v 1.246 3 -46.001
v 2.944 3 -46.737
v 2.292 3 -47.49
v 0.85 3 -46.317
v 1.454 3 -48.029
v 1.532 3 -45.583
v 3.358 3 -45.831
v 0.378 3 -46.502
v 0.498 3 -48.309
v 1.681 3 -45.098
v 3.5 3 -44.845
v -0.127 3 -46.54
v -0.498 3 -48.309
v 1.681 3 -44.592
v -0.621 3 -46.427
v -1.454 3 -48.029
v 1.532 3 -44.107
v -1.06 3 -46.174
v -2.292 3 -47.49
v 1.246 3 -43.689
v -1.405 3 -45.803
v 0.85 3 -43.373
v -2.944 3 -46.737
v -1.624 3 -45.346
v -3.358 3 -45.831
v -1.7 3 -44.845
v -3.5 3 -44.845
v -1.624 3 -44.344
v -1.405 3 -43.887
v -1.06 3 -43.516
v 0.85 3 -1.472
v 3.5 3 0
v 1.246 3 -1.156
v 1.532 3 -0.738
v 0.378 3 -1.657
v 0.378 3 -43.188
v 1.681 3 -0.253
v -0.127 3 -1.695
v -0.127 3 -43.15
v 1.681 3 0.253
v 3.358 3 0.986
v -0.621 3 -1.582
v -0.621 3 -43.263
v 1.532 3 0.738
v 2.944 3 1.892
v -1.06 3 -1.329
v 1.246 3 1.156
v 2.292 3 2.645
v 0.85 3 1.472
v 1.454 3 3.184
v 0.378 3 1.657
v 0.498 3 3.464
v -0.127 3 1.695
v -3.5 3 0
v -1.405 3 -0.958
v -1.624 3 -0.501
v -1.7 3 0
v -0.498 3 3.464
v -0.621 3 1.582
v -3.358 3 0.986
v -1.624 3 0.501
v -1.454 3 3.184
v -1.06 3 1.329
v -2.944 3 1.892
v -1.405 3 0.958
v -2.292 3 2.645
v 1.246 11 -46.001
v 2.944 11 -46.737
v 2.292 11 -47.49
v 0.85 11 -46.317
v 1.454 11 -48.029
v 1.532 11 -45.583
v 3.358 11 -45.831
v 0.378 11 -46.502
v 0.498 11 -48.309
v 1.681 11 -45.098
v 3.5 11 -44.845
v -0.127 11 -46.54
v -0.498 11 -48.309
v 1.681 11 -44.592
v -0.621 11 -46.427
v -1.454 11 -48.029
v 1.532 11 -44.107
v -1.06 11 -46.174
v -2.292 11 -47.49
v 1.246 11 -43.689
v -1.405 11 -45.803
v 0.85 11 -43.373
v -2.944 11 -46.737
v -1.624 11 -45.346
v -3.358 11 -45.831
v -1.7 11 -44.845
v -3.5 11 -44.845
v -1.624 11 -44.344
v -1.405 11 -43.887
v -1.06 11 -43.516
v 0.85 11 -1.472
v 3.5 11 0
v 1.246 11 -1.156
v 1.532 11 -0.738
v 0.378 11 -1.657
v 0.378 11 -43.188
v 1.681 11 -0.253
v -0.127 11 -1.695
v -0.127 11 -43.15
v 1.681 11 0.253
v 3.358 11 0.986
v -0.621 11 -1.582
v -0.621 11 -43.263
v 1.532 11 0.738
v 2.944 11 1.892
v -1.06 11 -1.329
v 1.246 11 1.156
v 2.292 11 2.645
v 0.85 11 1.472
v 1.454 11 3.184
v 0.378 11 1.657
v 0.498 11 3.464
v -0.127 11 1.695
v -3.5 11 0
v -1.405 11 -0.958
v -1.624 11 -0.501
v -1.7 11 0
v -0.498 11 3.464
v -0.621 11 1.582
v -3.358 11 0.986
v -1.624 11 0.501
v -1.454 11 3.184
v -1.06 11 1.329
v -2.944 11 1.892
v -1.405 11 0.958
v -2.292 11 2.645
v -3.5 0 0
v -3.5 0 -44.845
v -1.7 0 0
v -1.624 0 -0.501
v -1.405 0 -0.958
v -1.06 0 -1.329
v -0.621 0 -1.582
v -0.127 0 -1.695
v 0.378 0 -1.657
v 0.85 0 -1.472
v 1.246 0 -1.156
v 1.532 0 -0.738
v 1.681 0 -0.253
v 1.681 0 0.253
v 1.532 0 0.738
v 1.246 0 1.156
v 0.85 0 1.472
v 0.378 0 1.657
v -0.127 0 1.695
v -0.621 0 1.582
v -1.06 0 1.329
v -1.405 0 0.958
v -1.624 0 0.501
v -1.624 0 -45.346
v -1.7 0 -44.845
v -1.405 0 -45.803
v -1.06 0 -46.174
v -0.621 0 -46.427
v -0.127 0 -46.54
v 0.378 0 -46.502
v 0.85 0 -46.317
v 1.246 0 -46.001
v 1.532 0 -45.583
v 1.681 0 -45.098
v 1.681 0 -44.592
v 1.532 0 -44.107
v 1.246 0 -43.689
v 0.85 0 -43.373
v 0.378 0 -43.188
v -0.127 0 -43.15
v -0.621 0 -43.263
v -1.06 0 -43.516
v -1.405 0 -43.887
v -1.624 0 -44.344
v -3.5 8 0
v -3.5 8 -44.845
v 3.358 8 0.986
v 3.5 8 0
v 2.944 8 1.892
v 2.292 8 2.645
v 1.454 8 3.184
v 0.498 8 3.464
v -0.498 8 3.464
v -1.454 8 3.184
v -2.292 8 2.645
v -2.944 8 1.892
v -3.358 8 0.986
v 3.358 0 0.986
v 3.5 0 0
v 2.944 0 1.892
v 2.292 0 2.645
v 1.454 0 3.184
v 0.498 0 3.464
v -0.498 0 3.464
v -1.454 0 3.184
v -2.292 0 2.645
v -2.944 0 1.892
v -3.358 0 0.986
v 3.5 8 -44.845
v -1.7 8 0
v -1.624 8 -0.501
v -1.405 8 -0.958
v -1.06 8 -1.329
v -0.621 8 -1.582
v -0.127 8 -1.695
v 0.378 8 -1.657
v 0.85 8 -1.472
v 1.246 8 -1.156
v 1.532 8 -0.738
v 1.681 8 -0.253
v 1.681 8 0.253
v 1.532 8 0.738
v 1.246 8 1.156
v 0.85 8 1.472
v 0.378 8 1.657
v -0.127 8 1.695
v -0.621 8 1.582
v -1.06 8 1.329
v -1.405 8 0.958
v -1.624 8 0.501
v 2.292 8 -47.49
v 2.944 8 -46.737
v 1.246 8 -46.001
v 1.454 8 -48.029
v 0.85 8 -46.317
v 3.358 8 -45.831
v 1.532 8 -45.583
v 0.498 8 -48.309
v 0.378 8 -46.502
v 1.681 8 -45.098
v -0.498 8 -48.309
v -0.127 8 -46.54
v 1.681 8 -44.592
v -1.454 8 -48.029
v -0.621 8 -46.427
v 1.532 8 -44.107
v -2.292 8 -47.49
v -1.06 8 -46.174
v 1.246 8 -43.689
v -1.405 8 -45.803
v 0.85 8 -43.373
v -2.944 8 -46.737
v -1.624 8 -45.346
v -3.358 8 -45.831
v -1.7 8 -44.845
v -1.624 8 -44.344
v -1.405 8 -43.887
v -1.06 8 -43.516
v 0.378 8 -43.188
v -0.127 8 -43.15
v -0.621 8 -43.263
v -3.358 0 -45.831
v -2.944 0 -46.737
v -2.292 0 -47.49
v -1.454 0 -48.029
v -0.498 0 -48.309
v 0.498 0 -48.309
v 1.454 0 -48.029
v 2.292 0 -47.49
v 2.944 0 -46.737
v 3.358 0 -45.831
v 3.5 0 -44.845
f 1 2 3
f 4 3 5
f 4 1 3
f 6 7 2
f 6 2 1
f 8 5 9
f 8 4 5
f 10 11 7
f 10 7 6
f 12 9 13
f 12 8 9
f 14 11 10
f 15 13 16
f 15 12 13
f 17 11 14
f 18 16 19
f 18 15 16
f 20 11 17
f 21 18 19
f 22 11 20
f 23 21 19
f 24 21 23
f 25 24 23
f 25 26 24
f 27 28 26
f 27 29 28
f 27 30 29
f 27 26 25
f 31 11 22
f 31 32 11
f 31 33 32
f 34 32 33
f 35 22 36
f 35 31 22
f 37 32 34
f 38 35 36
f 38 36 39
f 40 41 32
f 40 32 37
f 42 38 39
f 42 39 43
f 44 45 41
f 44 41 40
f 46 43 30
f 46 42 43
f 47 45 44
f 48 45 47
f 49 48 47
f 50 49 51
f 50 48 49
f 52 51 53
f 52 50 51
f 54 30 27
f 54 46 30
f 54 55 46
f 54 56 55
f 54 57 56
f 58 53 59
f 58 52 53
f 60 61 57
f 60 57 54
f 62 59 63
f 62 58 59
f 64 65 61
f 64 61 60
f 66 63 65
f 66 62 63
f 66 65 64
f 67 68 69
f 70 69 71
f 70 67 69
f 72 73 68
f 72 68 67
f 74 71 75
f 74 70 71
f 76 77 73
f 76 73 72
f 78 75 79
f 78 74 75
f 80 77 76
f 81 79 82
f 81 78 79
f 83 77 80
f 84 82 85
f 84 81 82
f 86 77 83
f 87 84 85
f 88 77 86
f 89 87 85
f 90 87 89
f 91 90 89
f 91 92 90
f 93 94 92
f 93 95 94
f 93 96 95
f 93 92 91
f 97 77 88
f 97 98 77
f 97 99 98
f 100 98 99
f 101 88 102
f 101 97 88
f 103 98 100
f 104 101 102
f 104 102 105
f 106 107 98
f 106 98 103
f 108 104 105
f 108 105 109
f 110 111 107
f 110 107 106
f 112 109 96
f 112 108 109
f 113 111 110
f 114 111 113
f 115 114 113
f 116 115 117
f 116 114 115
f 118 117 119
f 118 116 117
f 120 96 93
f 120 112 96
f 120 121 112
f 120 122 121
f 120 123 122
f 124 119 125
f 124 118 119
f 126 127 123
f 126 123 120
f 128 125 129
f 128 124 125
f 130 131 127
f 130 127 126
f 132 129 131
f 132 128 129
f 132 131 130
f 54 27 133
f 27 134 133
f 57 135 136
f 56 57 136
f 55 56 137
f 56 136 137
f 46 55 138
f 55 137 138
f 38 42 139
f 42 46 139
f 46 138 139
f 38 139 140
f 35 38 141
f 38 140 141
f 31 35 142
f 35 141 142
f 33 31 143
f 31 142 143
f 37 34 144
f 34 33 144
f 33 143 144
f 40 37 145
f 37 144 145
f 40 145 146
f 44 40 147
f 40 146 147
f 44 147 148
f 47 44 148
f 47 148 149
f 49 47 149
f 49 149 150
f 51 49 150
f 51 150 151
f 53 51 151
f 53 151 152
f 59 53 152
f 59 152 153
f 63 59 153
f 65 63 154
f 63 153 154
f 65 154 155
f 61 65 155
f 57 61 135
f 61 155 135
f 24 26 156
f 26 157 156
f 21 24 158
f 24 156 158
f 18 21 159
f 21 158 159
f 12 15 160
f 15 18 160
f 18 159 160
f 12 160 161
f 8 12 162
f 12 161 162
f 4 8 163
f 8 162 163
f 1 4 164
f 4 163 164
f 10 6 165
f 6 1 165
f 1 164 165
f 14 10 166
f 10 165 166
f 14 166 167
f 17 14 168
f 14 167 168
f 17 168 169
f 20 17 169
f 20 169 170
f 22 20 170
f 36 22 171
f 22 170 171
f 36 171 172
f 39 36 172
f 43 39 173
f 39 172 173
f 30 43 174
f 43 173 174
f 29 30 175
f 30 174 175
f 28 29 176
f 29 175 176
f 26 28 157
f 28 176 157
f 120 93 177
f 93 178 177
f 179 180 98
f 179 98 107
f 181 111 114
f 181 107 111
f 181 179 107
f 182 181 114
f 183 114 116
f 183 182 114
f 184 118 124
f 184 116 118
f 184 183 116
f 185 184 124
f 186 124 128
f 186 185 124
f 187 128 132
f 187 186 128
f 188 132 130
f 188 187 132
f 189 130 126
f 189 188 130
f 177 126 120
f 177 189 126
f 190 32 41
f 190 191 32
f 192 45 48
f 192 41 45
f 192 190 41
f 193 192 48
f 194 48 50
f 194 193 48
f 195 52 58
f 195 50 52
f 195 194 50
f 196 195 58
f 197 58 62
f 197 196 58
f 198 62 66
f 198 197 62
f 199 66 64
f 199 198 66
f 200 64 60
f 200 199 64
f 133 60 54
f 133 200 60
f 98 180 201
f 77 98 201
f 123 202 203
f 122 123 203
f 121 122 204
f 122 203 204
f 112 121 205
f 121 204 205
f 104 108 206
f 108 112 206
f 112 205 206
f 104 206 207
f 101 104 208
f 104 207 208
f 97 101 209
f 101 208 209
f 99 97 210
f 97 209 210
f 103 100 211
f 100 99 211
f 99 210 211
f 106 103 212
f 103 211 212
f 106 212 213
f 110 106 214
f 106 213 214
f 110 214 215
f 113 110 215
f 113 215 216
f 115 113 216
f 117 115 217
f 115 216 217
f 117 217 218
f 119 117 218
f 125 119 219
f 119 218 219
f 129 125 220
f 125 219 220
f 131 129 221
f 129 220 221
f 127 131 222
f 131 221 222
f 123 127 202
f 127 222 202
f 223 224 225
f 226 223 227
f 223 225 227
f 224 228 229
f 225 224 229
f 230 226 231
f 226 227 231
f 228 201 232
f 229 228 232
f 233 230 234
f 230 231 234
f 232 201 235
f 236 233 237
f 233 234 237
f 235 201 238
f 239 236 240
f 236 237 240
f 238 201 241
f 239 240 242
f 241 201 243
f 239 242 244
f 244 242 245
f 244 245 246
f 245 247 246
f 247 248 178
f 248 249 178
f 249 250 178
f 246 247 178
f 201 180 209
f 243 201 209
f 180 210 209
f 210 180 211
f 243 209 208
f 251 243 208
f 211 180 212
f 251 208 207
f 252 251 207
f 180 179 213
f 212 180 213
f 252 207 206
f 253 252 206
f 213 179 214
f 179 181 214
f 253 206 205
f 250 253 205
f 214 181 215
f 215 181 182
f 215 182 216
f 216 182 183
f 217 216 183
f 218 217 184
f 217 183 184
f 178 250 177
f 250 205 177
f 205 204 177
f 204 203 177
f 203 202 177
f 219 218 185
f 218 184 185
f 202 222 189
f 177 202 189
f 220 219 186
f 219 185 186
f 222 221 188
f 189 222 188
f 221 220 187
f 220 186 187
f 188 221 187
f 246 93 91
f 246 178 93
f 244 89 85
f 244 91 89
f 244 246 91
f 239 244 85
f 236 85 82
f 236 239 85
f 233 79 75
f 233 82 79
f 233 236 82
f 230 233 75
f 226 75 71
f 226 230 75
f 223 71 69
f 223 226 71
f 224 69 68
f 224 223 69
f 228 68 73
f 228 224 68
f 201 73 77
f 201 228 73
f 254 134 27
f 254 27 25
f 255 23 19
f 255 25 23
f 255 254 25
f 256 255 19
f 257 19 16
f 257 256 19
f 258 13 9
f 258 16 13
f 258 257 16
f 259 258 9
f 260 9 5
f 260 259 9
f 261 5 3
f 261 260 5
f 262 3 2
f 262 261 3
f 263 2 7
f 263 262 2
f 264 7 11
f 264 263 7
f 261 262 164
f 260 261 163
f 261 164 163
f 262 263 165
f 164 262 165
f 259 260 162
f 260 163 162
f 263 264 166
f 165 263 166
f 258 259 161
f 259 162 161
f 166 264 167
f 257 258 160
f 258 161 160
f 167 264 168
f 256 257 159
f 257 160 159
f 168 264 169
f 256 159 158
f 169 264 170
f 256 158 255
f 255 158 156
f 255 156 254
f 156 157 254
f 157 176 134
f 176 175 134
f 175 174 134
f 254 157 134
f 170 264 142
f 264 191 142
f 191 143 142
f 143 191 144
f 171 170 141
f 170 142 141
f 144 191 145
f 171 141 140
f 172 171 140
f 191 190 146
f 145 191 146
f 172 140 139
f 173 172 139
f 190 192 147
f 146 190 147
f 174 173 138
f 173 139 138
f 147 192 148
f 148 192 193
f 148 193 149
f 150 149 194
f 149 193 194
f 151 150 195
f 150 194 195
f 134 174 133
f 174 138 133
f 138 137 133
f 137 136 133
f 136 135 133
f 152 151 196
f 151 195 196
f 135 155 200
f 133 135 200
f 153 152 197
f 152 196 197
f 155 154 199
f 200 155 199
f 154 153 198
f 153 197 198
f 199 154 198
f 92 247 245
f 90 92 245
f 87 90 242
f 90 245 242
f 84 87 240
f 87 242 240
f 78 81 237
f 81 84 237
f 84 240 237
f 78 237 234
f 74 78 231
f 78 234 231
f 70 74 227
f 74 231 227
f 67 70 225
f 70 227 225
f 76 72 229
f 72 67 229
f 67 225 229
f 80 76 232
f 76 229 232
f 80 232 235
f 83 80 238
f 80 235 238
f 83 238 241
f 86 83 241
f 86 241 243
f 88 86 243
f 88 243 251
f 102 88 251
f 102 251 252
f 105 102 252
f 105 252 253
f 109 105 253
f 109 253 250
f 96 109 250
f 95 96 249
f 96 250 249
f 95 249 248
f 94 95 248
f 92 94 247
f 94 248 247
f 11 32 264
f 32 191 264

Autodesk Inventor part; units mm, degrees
ref_plane "YZ Plane" through (0, 0, 0) normal (1, 0, 0) x (0, 1, 0)
ref_plane "XZ Plane" through (0, 0, 0) normal (0, 1, 0) x (-1, 0, 0)
ref_plane "XY Plane" through (0, 0, 0) normal (0, 0, 1) x (1, 0, 0)
sketch "Sketch1" plane through (0, 0, 0) normal (0, 1, 0) x (-1, 0, 0)
  line L0 (0, 0) -> (0, -44.845) construction
  line L1 (-3.5, 0) -> (-3.5, -44.845)
  line L2 (3.5, -44.845) -> (3.5, 0)
  arc A0 (3.5, 0) -> (-3.5, 0) centre (0, 0) ccw
  arc A1 (-3.5, -44.845) -> (3.5, -44.845) centre (0, -44.845) ccw
  circle A2 centre (0, 0) radius 1.7
  circle A3 centre (0, -44.845) radius 1.7
  point P0 (0, -22.4225)
  dimension "d0" = 7
  dimension "d1" = 3.4
  dimension "d2" = 3.4
  dimension "d3" = 44.845
extrude "Extrusion1" add sketch "Sketch1" along normal blind 3
pattern_linear "Rectangular Pattern1" count 2 spacing 8 along (0, 1, 0) of "Extrusion1"
properties part number "Corredera_IV"
